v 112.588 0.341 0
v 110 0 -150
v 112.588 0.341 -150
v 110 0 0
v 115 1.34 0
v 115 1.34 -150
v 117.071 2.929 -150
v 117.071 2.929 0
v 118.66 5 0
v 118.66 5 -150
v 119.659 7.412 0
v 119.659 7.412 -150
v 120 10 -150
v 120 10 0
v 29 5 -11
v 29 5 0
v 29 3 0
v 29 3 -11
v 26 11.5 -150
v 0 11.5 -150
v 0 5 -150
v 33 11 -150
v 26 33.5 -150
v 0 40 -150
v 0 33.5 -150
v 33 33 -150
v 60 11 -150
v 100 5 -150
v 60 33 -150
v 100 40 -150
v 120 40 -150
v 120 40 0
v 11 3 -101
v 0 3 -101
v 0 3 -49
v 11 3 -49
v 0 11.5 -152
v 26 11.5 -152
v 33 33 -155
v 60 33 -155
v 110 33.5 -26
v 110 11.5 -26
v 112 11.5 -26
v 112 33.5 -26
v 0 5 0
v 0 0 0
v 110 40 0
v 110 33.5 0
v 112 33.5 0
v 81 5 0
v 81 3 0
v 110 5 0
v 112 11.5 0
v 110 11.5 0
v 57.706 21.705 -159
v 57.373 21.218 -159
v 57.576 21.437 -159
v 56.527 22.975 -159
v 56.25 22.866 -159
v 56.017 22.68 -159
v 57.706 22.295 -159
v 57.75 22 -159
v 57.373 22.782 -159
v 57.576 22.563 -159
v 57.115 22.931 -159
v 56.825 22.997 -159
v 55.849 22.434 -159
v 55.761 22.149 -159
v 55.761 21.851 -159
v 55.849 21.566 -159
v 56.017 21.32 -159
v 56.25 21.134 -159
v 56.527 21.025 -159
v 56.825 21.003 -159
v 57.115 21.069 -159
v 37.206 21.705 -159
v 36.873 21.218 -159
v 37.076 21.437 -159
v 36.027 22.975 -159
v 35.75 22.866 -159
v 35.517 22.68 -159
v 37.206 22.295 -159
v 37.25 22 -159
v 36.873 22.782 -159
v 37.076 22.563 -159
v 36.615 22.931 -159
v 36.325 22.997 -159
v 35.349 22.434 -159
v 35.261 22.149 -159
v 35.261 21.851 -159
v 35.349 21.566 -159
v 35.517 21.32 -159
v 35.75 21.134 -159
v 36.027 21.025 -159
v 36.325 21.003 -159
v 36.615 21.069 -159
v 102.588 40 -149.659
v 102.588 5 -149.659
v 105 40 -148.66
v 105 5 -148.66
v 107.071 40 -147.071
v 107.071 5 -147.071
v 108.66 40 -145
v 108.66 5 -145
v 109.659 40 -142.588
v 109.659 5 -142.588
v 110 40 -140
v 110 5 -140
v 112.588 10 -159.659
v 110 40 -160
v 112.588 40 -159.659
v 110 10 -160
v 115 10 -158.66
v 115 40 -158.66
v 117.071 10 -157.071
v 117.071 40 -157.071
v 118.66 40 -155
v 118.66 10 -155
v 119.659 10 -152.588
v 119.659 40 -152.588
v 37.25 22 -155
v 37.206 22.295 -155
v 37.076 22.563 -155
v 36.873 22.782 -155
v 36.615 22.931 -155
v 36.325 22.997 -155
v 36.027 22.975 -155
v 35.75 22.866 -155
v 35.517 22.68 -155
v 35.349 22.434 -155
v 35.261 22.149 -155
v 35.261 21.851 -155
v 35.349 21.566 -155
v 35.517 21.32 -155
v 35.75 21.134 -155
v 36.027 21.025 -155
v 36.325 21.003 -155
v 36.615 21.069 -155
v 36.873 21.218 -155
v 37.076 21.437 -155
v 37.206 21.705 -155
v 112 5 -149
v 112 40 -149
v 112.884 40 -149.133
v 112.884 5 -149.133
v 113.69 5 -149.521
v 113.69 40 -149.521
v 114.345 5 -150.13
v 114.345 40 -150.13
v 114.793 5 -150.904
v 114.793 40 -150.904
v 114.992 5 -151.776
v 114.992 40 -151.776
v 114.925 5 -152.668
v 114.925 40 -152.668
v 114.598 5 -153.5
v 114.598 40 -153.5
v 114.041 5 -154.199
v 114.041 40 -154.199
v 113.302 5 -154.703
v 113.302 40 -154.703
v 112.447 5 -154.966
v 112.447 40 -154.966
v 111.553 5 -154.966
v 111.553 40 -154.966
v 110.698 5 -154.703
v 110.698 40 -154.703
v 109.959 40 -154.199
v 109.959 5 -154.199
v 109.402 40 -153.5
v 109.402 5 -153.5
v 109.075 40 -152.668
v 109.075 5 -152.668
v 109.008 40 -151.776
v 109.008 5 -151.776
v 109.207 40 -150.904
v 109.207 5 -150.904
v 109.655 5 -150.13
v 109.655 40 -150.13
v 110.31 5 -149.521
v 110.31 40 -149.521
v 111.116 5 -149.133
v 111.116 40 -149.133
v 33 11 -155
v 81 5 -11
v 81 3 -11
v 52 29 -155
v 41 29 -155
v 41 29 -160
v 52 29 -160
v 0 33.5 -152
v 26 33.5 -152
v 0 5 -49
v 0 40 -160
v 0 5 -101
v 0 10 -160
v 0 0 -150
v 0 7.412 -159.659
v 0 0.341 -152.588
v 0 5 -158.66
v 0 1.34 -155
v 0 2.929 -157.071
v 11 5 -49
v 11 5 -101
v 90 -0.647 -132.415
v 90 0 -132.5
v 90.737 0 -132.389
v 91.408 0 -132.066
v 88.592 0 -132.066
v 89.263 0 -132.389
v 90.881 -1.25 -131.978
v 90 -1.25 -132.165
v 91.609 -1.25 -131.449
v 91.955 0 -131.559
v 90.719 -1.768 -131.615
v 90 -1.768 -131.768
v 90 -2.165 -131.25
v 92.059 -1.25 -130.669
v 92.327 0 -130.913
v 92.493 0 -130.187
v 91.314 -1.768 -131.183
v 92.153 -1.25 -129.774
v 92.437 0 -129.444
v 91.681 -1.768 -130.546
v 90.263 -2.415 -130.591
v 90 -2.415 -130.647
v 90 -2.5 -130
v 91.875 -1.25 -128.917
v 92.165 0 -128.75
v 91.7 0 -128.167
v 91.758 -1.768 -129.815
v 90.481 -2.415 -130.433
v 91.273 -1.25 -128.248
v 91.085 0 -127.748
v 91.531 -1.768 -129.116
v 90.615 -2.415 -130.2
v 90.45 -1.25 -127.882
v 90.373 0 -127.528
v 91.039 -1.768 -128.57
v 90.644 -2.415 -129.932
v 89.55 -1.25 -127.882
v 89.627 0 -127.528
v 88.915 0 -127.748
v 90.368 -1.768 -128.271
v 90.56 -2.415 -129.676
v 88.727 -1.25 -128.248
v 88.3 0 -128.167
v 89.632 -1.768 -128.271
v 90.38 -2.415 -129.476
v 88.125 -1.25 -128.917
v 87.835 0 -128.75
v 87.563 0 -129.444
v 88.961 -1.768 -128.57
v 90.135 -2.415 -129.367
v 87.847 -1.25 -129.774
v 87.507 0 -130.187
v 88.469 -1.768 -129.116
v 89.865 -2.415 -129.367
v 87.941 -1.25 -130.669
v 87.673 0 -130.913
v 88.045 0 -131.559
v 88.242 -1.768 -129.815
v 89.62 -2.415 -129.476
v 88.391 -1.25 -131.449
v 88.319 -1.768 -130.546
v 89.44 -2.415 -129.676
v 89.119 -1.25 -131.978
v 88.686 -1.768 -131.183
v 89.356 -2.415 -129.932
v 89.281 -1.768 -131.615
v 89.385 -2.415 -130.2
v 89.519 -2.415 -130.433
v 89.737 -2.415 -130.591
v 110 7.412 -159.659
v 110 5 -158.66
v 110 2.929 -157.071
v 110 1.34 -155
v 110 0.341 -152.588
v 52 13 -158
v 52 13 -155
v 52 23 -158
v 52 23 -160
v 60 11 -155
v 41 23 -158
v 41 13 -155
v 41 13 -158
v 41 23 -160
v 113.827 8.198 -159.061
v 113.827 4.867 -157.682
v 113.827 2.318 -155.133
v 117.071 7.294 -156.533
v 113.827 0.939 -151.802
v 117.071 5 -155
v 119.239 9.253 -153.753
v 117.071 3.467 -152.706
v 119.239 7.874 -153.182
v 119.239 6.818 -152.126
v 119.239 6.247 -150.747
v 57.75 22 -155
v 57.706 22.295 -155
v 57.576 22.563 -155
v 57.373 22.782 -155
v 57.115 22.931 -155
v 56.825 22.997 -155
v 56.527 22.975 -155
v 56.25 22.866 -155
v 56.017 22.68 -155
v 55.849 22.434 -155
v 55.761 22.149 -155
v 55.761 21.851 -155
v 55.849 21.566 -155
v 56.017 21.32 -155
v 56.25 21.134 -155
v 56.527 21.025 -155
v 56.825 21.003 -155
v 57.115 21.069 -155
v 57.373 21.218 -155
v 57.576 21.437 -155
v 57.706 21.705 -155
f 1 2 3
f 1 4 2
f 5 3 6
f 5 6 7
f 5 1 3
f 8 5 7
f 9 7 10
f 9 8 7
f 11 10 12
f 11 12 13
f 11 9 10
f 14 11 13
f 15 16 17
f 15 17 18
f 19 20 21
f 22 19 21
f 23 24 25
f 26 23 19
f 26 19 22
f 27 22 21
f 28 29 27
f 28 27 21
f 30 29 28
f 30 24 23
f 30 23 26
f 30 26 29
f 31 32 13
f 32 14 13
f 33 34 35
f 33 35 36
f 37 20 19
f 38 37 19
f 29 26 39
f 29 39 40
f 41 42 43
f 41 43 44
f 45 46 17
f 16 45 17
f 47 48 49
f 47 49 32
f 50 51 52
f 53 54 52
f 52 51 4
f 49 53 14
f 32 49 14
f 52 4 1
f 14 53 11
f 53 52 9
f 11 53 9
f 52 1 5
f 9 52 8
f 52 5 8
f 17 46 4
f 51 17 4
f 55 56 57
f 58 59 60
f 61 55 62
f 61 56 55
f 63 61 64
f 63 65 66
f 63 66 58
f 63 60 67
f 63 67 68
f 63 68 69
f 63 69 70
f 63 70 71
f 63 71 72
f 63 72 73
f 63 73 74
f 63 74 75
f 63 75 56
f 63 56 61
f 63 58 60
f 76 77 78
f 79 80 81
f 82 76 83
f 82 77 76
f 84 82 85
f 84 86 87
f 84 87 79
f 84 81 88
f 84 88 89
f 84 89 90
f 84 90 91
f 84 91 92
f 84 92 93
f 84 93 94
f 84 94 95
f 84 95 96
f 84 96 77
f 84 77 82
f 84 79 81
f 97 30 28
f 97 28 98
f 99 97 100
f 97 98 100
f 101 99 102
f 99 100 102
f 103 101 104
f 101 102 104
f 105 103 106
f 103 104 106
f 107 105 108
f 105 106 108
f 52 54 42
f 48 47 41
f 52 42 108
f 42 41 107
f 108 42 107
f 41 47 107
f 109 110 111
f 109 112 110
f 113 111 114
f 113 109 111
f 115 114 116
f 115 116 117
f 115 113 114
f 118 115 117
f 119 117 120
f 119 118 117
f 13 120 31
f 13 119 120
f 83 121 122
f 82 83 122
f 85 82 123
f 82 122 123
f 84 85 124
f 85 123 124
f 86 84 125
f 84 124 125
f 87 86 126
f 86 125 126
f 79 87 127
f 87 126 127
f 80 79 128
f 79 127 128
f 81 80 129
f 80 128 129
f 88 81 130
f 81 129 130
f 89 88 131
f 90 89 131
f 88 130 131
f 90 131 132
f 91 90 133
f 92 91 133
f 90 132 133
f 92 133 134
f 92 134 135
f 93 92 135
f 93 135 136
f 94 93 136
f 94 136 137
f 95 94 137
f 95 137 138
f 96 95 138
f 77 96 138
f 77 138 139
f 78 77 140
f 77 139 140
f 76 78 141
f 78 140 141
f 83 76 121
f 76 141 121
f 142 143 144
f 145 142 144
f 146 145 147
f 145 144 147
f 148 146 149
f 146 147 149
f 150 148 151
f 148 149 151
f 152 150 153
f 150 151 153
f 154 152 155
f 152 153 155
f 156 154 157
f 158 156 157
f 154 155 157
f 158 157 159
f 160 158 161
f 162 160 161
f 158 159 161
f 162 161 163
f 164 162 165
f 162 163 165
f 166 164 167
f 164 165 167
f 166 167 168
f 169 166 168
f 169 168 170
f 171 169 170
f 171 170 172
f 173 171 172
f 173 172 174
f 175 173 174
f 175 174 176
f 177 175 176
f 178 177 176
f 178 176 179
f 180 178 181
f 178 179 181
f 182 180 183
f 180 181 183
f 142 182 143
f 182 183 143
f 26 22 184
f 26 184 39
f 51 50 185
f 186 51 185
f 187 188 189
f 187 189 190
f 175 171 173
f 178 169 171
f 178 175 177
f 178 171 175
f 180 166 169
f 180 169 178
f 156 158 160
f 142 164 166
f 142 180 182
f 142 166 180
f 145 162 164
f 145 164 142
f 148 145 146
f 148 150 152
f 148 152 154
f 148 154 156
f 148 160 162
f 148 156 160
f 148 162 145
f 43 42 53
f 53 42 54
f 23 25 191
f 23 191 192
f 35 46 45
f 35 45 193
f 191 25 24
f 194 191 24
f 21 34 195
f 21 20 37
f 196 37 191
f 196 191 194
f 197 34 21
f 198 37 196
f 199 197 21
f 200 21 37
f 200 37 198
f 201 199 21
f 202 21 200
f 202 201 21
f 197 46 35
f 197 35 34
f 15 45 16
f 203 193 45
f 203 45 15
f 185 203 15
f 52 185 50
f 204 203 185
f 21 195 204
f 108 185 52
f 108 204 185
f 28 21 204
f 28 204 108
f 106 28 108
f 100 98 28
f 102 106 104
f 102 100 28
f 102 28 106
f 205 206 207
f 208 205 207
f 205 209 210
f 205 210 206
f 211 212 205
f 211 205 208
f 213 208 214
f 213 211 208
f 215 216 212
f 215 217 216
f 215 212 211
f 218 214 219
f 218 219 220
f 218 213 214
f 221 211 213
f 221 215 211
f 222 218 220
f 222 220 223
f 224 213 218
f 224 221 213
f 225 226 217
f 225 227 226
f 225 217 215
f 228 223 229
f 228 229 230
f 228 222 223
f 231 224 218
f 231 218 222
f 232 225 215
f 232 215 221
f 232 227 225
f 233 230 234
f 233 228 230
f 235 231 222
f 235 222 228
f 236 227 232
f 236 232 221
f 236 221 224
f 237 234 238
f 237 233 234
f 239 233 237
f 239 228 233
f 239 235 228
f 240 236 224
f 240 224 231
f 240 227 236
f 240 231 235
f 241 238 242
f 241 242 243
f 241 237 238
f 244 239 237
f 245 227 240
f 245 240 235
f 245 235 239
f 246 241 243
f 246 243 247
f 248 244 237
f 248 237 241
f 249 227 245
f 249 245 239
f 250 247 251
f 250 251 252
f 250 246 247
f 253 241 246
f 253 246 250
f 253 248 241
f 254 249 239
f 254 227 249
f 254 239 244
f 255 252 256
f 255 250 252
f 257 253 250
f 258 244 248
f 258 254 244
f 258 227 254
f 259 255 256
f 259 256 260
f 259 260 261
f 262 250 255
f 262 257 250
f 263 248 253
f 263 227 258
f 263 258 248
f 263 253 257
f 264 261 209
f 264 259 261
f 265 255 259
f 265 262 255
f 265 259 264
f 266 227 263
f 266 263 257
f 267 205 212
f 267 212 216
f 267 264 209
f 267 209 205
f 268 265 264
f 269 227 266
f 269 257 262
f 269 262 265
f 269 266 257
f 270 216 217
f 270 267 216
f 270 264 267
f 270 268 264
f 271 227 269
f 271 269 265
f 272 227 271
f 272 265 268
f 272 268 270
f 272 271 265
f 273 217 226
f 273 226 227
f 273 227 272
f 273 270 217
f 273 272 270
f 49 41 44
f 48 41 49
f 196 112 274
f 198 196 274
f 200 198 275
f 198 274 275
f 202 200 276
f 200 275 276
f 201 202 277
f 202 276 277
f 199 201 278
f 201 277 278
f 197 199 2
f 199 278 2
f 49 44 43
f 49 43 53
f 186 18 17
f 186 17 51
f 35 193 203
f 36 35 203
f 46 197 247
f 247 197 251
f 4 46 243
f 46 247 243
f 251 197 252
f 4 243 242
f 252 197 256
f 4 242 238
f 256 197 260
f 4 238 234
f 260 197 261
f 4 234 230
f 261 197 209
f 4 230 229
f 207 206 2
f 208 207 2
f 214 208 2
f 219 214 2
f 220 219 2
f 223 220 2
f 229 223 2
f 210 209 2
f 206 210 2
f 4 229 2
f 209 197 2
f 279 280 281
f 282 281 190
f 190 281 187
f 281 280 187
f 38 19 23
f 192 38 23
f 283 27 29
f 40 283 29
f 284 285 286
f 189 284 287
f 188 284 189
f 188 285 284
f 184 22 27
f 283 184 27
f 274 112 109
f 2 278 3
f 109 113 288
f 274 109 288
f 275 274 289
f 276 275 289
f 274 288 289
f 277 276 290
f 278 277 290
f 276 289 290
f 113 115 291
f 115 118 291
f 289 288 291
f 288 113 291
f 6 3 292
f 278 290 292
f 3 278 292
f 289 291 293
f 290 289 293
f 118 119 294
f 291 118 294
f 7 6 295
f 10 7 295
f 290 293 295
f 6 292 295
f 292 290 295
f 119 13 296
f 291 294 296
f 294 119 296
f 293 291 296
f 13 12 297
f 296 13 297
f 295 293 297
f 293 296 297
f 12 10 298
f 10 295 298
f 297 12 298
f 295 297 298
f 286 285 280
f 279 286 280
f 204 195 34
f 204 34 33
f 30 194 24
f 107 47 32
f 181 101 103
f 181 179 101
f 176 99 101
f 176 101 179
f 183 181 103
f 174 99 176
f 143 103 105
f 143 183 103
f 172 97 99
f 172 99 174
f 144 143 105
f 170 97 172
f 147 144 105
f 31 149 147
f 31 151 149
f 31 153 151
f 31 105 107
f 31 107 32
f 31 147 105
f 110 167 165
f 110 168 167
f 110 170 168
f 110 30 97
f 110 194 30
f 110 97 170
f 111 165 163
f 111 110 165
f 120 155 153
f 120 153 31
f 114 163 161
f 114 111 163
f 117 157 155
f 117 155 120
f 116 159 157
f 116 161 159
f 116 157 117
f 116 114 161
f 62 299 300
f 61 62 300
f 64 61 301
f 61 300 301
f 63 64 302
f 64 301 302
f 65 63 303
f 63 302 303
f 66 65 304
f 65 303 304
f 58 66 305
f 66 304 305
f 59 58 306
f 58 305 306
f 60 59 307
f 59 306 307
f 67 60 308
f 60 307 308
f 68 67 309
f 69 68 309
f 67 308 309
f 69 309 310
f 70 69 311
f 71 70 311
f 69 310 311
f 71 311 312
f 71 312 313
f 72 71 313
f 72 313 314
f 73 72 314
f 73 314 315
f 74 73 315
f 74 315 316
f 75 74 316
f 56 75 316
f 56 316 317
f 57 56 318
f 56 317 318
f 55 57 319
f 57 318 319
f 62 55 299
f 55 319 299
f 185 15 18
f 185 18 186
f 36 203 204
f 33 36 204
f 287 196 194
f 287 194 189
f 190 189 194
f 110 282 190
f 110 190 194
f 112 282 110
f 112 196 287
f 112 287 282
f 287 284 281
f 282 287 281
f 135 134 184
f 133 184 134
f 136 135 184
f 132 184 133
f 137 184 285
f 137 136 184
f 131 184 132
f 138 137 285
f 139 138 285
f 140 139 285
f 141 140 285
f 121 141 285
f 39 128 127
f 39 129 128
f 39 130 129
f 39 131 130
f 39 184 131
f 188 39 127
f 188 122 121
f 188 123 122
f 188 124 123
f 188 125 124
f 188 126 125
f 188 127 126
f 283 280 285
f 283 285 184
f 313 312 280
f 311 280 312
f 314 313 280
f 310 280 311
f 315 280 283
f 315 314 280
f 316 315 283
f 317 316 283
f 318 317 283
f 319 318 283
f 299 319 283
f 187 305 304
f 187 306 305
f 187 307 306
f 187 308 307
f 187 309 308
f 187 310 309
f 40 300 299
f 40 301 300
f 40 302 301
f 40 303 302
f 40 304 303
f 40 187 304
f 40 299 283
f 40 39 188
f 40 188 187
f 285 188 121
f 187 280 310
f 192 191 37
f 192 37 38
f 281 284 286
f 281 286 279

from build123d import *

# Parameters (mm, degrees)
ESQUISSE1_W             = 120
ESQUISSE1_H             = 160
BOSS_EXTRU_1_DEPTH      = 40
CONG_1_R                = 10
CONG_2_R                = 10
ESQUISSE2_W             = 110
ESQUISSE2_H             = 150
ENL_V_MAT_EXTRU_1_DEPTH = 35
CONG_3_R                = 10
ESQUISSE3_R             = 3
ENL_V_MAT_EXTRU_2_DEPTH = 35
ESQUISSE4_R             = 2.5
BOSS_EXTRU_2_DEPTH      = 2.5
CONG_4_R                = 2.5
ESQUISSE5_W             = 11
ESQUISSE5_H             = 52
ESQUISSE5_W_2           = 52
ESQUISSE5_H_2           = 11
ENL_V_MAT_EXTRU_3_DEPTH = 2
ESQUISSE6_W             = 26
ESQUISSE6_H             = 22
ENL_V_MAT_EXTRU_4_DEPTH = 2
ESQUISSE7_W             = 26
ESQUISSE7_H             = 22
ENL_V_MAT_EXTRU_5_DEPTH = 2
ESQUISSE8_W             = 27
ESQUISSE8_H             = 22
ENL_V_MAT_EXTRU_6_DEPTH = 5
ESQUISSE9_R             = 1
ENL_V_MAT_EXTRU_7_DEPTH = 4
ESQUISSE10_W            = 11
ESQUISSE10_H            = 6
ENL_V_MAT_EXTRU_8_DEPTH = 201.062490237
ESQUISSE11_W            = 11
ESQUISSE11_H            = 10
ENL_V_MAT_EXTRU_9_DEPTH = 3


with BuildPart() as part:
    # Esquisse1 → Boss.-Extru.1 (new body)
    with BuildSketch(Plane(origin=(0, 0, 0), x_dir=(1, 0, 0), z_dir=(0, 1, 0))):
        with Locations((60, 80)):
            Rectangle(ESQUISSE1_W, ESQUISSE1_H)
    extrude(amount=BOSS_EXTRU_1_DEPTH)

    # Congé1
    cong_1_edges = [part.edges().sort_by_distance(p)[0] for p in [
        (60, 0, -160),
    ]]
    fillet(cong_1_edges, radius=CONG_1_R)

    # Congé2
    cong_2_edges = [part.edges().sort_by_distance(p)[0] for p in [
        (120, 2.928932188, -157.071067812),
        (120, 0, -75),
        (120, 25, -160),
    ]]
    fillet(cong_2_edges, radius=CONG_2_R)

    # Esquisse2 → Enlèv. mat.-Extru.1 (cut)
    with BuildSketch(Plane(origin=(0, 40, 0), x_dir=(1, 0, 0), z_dir=(0, 1, 0))):
        with Locations((55, 75)):
            Rectangle(ESQUISSE2_W, ESQUISSE2_H)
    extrude(amount=-ENL_V_MAT_EXTRU_1_DEPTH, mode=Mode.SUBTRACT)

    # Congé3
    cong_3_edges = [part.edges().sort_by_distance(p)[0] for p in [
        (110, 22.5, -150),
    ]]
    fillet(cong_3_edges, radius=CONG_3_R)

    # Esquisse3 → Enlèv. mat.-Extru.2 (cut)
    with BuildSketch(Plane(origin=(0, 40, 0), x_dir=(1, 0, 0), z_dir=(0, 1, 0))):
        with Locations(Location((112, 152, 0), (0, 0, 270))):
            Circle(ESQUISSE3_R)
    extrude(amount=-ENL_V_MAT_EXTRU_2_DEPTH, mode=Mode.SUBTRACT)

    # Esquisse4 → Boss.-Extru.2 (add)
    with BuildSketch(Plane.XZ):
        with Locations(Location((90, -130, 0), (0, 0, 270))):
            Circle(ESQUISSE4_R)
    extrude(amount=BOSS_EXTRU_2_DEPTH)

    # Congé4
    cong_4_edges = [part.edges().sort_by_distance(p)[0] for p in [
        (90, -2.5, -127.5),
    ]]
    fillet(cong_4_edges, radius=CONG_4_R - 0.0001)  # a hair under: the kernel refuses the full size

    # Esquisse5 → Enlèv. mat.-Extru.3 (cut)
    with BuildSketch(Plane(origin=(0, 5, 0), x_dir=(1, 0, 0), z_dir=(0, 1, 0))):
        with Locations((5.5, 75)):
            Rectangle(ESQUISSE5_W, ESQUISSE5_H)
        with Locations((55, 5.5)):
            Rectangle(ESQUISSE5_W_2, ESQUISSE5_H_2)
    extrude(amount=-ENL_V_MAT_EXTRU_3_DEPTH, mode=Mode.SUBTRACT)

    # Esquisse6 → Enlèv. mat.-Extru.4 (cut)
    with BuildSketch(Plane.XY.offset(-150)):
        with Locations((13, 22.5)):
            Rectangle(ESQUISSE6_W, ESQUISSE6_H)
    extrude(amount=-ENL_V_MAT_EXTRU_4_DEPTH, mode=Mode.SUBTRACT)

    # Esquisse7 → Enlèv. mat.-Extru.5 (cut)
    with BuildSketch(Plane.ZY.offset(-110)):
        with Locations((-13, 22.5)):
            Rectangle(ESQUISSE7_W, ESQUISSE7_H)
    extrude(amount=-ENL_V_MAT_EXTRU_5_DEPTH, mode=Mode.SUBTRACT)

    # Esquisse8 → Enlèv. mat.-Extru.6 (cut)
    with BuildSketch(Plane.XY.offset(-150)):
        with Locations((46.5, 22)):
            Rectangle(ESQUISSE8_W, ESQUISSE8_H)
    extrude(amount=-ENL_V_MAT_EXTRU_6_DEPTH, mode=Mode.SUBTRACT)

    # Esquisse9 → Enlèv. mat.-Extru.7 (cut)
    with BuildSketch(Plane.XY.offset(-155)):
        with Locations((56.75, 22)):
            Circle(ESQUISSE9_R)
        with Locations((36.25, 22)):
            Circle(ESQUISSE9_R)
    extrude(amount=-ENL_V_MAT_EXTRU_7_DEPTH, mode=Mode.SUBTRACT)

    # Esquisse10 → Enlèv. mat.-Extru.8 (cut, through all)
    with BuildSketch(Plane.XY.offset(-155)):
        with Locations((46.5, 26)):
            Rectangle(ESQUISSE10_W, ESQUISSE10_H)
    extrude(amount=-ENL_V_MAT_EXTRU_8_DEPTH, mode=Mode.SUBTRACT)

    # Esquisse11 → Enlèv. mat.-Extru.9 (cut)
    with BuildSketch(Plane.XY.offset(-155)):
        with Locations((46.5, 18)):
            Rectangle(ESQUISSE11_W, ESQUISSE11_H)
    extrude(amount=-ENL_V_MAT_EXTRU_9_DEPTH, mode=Mode.SUBTRACT)


solid = part.part
